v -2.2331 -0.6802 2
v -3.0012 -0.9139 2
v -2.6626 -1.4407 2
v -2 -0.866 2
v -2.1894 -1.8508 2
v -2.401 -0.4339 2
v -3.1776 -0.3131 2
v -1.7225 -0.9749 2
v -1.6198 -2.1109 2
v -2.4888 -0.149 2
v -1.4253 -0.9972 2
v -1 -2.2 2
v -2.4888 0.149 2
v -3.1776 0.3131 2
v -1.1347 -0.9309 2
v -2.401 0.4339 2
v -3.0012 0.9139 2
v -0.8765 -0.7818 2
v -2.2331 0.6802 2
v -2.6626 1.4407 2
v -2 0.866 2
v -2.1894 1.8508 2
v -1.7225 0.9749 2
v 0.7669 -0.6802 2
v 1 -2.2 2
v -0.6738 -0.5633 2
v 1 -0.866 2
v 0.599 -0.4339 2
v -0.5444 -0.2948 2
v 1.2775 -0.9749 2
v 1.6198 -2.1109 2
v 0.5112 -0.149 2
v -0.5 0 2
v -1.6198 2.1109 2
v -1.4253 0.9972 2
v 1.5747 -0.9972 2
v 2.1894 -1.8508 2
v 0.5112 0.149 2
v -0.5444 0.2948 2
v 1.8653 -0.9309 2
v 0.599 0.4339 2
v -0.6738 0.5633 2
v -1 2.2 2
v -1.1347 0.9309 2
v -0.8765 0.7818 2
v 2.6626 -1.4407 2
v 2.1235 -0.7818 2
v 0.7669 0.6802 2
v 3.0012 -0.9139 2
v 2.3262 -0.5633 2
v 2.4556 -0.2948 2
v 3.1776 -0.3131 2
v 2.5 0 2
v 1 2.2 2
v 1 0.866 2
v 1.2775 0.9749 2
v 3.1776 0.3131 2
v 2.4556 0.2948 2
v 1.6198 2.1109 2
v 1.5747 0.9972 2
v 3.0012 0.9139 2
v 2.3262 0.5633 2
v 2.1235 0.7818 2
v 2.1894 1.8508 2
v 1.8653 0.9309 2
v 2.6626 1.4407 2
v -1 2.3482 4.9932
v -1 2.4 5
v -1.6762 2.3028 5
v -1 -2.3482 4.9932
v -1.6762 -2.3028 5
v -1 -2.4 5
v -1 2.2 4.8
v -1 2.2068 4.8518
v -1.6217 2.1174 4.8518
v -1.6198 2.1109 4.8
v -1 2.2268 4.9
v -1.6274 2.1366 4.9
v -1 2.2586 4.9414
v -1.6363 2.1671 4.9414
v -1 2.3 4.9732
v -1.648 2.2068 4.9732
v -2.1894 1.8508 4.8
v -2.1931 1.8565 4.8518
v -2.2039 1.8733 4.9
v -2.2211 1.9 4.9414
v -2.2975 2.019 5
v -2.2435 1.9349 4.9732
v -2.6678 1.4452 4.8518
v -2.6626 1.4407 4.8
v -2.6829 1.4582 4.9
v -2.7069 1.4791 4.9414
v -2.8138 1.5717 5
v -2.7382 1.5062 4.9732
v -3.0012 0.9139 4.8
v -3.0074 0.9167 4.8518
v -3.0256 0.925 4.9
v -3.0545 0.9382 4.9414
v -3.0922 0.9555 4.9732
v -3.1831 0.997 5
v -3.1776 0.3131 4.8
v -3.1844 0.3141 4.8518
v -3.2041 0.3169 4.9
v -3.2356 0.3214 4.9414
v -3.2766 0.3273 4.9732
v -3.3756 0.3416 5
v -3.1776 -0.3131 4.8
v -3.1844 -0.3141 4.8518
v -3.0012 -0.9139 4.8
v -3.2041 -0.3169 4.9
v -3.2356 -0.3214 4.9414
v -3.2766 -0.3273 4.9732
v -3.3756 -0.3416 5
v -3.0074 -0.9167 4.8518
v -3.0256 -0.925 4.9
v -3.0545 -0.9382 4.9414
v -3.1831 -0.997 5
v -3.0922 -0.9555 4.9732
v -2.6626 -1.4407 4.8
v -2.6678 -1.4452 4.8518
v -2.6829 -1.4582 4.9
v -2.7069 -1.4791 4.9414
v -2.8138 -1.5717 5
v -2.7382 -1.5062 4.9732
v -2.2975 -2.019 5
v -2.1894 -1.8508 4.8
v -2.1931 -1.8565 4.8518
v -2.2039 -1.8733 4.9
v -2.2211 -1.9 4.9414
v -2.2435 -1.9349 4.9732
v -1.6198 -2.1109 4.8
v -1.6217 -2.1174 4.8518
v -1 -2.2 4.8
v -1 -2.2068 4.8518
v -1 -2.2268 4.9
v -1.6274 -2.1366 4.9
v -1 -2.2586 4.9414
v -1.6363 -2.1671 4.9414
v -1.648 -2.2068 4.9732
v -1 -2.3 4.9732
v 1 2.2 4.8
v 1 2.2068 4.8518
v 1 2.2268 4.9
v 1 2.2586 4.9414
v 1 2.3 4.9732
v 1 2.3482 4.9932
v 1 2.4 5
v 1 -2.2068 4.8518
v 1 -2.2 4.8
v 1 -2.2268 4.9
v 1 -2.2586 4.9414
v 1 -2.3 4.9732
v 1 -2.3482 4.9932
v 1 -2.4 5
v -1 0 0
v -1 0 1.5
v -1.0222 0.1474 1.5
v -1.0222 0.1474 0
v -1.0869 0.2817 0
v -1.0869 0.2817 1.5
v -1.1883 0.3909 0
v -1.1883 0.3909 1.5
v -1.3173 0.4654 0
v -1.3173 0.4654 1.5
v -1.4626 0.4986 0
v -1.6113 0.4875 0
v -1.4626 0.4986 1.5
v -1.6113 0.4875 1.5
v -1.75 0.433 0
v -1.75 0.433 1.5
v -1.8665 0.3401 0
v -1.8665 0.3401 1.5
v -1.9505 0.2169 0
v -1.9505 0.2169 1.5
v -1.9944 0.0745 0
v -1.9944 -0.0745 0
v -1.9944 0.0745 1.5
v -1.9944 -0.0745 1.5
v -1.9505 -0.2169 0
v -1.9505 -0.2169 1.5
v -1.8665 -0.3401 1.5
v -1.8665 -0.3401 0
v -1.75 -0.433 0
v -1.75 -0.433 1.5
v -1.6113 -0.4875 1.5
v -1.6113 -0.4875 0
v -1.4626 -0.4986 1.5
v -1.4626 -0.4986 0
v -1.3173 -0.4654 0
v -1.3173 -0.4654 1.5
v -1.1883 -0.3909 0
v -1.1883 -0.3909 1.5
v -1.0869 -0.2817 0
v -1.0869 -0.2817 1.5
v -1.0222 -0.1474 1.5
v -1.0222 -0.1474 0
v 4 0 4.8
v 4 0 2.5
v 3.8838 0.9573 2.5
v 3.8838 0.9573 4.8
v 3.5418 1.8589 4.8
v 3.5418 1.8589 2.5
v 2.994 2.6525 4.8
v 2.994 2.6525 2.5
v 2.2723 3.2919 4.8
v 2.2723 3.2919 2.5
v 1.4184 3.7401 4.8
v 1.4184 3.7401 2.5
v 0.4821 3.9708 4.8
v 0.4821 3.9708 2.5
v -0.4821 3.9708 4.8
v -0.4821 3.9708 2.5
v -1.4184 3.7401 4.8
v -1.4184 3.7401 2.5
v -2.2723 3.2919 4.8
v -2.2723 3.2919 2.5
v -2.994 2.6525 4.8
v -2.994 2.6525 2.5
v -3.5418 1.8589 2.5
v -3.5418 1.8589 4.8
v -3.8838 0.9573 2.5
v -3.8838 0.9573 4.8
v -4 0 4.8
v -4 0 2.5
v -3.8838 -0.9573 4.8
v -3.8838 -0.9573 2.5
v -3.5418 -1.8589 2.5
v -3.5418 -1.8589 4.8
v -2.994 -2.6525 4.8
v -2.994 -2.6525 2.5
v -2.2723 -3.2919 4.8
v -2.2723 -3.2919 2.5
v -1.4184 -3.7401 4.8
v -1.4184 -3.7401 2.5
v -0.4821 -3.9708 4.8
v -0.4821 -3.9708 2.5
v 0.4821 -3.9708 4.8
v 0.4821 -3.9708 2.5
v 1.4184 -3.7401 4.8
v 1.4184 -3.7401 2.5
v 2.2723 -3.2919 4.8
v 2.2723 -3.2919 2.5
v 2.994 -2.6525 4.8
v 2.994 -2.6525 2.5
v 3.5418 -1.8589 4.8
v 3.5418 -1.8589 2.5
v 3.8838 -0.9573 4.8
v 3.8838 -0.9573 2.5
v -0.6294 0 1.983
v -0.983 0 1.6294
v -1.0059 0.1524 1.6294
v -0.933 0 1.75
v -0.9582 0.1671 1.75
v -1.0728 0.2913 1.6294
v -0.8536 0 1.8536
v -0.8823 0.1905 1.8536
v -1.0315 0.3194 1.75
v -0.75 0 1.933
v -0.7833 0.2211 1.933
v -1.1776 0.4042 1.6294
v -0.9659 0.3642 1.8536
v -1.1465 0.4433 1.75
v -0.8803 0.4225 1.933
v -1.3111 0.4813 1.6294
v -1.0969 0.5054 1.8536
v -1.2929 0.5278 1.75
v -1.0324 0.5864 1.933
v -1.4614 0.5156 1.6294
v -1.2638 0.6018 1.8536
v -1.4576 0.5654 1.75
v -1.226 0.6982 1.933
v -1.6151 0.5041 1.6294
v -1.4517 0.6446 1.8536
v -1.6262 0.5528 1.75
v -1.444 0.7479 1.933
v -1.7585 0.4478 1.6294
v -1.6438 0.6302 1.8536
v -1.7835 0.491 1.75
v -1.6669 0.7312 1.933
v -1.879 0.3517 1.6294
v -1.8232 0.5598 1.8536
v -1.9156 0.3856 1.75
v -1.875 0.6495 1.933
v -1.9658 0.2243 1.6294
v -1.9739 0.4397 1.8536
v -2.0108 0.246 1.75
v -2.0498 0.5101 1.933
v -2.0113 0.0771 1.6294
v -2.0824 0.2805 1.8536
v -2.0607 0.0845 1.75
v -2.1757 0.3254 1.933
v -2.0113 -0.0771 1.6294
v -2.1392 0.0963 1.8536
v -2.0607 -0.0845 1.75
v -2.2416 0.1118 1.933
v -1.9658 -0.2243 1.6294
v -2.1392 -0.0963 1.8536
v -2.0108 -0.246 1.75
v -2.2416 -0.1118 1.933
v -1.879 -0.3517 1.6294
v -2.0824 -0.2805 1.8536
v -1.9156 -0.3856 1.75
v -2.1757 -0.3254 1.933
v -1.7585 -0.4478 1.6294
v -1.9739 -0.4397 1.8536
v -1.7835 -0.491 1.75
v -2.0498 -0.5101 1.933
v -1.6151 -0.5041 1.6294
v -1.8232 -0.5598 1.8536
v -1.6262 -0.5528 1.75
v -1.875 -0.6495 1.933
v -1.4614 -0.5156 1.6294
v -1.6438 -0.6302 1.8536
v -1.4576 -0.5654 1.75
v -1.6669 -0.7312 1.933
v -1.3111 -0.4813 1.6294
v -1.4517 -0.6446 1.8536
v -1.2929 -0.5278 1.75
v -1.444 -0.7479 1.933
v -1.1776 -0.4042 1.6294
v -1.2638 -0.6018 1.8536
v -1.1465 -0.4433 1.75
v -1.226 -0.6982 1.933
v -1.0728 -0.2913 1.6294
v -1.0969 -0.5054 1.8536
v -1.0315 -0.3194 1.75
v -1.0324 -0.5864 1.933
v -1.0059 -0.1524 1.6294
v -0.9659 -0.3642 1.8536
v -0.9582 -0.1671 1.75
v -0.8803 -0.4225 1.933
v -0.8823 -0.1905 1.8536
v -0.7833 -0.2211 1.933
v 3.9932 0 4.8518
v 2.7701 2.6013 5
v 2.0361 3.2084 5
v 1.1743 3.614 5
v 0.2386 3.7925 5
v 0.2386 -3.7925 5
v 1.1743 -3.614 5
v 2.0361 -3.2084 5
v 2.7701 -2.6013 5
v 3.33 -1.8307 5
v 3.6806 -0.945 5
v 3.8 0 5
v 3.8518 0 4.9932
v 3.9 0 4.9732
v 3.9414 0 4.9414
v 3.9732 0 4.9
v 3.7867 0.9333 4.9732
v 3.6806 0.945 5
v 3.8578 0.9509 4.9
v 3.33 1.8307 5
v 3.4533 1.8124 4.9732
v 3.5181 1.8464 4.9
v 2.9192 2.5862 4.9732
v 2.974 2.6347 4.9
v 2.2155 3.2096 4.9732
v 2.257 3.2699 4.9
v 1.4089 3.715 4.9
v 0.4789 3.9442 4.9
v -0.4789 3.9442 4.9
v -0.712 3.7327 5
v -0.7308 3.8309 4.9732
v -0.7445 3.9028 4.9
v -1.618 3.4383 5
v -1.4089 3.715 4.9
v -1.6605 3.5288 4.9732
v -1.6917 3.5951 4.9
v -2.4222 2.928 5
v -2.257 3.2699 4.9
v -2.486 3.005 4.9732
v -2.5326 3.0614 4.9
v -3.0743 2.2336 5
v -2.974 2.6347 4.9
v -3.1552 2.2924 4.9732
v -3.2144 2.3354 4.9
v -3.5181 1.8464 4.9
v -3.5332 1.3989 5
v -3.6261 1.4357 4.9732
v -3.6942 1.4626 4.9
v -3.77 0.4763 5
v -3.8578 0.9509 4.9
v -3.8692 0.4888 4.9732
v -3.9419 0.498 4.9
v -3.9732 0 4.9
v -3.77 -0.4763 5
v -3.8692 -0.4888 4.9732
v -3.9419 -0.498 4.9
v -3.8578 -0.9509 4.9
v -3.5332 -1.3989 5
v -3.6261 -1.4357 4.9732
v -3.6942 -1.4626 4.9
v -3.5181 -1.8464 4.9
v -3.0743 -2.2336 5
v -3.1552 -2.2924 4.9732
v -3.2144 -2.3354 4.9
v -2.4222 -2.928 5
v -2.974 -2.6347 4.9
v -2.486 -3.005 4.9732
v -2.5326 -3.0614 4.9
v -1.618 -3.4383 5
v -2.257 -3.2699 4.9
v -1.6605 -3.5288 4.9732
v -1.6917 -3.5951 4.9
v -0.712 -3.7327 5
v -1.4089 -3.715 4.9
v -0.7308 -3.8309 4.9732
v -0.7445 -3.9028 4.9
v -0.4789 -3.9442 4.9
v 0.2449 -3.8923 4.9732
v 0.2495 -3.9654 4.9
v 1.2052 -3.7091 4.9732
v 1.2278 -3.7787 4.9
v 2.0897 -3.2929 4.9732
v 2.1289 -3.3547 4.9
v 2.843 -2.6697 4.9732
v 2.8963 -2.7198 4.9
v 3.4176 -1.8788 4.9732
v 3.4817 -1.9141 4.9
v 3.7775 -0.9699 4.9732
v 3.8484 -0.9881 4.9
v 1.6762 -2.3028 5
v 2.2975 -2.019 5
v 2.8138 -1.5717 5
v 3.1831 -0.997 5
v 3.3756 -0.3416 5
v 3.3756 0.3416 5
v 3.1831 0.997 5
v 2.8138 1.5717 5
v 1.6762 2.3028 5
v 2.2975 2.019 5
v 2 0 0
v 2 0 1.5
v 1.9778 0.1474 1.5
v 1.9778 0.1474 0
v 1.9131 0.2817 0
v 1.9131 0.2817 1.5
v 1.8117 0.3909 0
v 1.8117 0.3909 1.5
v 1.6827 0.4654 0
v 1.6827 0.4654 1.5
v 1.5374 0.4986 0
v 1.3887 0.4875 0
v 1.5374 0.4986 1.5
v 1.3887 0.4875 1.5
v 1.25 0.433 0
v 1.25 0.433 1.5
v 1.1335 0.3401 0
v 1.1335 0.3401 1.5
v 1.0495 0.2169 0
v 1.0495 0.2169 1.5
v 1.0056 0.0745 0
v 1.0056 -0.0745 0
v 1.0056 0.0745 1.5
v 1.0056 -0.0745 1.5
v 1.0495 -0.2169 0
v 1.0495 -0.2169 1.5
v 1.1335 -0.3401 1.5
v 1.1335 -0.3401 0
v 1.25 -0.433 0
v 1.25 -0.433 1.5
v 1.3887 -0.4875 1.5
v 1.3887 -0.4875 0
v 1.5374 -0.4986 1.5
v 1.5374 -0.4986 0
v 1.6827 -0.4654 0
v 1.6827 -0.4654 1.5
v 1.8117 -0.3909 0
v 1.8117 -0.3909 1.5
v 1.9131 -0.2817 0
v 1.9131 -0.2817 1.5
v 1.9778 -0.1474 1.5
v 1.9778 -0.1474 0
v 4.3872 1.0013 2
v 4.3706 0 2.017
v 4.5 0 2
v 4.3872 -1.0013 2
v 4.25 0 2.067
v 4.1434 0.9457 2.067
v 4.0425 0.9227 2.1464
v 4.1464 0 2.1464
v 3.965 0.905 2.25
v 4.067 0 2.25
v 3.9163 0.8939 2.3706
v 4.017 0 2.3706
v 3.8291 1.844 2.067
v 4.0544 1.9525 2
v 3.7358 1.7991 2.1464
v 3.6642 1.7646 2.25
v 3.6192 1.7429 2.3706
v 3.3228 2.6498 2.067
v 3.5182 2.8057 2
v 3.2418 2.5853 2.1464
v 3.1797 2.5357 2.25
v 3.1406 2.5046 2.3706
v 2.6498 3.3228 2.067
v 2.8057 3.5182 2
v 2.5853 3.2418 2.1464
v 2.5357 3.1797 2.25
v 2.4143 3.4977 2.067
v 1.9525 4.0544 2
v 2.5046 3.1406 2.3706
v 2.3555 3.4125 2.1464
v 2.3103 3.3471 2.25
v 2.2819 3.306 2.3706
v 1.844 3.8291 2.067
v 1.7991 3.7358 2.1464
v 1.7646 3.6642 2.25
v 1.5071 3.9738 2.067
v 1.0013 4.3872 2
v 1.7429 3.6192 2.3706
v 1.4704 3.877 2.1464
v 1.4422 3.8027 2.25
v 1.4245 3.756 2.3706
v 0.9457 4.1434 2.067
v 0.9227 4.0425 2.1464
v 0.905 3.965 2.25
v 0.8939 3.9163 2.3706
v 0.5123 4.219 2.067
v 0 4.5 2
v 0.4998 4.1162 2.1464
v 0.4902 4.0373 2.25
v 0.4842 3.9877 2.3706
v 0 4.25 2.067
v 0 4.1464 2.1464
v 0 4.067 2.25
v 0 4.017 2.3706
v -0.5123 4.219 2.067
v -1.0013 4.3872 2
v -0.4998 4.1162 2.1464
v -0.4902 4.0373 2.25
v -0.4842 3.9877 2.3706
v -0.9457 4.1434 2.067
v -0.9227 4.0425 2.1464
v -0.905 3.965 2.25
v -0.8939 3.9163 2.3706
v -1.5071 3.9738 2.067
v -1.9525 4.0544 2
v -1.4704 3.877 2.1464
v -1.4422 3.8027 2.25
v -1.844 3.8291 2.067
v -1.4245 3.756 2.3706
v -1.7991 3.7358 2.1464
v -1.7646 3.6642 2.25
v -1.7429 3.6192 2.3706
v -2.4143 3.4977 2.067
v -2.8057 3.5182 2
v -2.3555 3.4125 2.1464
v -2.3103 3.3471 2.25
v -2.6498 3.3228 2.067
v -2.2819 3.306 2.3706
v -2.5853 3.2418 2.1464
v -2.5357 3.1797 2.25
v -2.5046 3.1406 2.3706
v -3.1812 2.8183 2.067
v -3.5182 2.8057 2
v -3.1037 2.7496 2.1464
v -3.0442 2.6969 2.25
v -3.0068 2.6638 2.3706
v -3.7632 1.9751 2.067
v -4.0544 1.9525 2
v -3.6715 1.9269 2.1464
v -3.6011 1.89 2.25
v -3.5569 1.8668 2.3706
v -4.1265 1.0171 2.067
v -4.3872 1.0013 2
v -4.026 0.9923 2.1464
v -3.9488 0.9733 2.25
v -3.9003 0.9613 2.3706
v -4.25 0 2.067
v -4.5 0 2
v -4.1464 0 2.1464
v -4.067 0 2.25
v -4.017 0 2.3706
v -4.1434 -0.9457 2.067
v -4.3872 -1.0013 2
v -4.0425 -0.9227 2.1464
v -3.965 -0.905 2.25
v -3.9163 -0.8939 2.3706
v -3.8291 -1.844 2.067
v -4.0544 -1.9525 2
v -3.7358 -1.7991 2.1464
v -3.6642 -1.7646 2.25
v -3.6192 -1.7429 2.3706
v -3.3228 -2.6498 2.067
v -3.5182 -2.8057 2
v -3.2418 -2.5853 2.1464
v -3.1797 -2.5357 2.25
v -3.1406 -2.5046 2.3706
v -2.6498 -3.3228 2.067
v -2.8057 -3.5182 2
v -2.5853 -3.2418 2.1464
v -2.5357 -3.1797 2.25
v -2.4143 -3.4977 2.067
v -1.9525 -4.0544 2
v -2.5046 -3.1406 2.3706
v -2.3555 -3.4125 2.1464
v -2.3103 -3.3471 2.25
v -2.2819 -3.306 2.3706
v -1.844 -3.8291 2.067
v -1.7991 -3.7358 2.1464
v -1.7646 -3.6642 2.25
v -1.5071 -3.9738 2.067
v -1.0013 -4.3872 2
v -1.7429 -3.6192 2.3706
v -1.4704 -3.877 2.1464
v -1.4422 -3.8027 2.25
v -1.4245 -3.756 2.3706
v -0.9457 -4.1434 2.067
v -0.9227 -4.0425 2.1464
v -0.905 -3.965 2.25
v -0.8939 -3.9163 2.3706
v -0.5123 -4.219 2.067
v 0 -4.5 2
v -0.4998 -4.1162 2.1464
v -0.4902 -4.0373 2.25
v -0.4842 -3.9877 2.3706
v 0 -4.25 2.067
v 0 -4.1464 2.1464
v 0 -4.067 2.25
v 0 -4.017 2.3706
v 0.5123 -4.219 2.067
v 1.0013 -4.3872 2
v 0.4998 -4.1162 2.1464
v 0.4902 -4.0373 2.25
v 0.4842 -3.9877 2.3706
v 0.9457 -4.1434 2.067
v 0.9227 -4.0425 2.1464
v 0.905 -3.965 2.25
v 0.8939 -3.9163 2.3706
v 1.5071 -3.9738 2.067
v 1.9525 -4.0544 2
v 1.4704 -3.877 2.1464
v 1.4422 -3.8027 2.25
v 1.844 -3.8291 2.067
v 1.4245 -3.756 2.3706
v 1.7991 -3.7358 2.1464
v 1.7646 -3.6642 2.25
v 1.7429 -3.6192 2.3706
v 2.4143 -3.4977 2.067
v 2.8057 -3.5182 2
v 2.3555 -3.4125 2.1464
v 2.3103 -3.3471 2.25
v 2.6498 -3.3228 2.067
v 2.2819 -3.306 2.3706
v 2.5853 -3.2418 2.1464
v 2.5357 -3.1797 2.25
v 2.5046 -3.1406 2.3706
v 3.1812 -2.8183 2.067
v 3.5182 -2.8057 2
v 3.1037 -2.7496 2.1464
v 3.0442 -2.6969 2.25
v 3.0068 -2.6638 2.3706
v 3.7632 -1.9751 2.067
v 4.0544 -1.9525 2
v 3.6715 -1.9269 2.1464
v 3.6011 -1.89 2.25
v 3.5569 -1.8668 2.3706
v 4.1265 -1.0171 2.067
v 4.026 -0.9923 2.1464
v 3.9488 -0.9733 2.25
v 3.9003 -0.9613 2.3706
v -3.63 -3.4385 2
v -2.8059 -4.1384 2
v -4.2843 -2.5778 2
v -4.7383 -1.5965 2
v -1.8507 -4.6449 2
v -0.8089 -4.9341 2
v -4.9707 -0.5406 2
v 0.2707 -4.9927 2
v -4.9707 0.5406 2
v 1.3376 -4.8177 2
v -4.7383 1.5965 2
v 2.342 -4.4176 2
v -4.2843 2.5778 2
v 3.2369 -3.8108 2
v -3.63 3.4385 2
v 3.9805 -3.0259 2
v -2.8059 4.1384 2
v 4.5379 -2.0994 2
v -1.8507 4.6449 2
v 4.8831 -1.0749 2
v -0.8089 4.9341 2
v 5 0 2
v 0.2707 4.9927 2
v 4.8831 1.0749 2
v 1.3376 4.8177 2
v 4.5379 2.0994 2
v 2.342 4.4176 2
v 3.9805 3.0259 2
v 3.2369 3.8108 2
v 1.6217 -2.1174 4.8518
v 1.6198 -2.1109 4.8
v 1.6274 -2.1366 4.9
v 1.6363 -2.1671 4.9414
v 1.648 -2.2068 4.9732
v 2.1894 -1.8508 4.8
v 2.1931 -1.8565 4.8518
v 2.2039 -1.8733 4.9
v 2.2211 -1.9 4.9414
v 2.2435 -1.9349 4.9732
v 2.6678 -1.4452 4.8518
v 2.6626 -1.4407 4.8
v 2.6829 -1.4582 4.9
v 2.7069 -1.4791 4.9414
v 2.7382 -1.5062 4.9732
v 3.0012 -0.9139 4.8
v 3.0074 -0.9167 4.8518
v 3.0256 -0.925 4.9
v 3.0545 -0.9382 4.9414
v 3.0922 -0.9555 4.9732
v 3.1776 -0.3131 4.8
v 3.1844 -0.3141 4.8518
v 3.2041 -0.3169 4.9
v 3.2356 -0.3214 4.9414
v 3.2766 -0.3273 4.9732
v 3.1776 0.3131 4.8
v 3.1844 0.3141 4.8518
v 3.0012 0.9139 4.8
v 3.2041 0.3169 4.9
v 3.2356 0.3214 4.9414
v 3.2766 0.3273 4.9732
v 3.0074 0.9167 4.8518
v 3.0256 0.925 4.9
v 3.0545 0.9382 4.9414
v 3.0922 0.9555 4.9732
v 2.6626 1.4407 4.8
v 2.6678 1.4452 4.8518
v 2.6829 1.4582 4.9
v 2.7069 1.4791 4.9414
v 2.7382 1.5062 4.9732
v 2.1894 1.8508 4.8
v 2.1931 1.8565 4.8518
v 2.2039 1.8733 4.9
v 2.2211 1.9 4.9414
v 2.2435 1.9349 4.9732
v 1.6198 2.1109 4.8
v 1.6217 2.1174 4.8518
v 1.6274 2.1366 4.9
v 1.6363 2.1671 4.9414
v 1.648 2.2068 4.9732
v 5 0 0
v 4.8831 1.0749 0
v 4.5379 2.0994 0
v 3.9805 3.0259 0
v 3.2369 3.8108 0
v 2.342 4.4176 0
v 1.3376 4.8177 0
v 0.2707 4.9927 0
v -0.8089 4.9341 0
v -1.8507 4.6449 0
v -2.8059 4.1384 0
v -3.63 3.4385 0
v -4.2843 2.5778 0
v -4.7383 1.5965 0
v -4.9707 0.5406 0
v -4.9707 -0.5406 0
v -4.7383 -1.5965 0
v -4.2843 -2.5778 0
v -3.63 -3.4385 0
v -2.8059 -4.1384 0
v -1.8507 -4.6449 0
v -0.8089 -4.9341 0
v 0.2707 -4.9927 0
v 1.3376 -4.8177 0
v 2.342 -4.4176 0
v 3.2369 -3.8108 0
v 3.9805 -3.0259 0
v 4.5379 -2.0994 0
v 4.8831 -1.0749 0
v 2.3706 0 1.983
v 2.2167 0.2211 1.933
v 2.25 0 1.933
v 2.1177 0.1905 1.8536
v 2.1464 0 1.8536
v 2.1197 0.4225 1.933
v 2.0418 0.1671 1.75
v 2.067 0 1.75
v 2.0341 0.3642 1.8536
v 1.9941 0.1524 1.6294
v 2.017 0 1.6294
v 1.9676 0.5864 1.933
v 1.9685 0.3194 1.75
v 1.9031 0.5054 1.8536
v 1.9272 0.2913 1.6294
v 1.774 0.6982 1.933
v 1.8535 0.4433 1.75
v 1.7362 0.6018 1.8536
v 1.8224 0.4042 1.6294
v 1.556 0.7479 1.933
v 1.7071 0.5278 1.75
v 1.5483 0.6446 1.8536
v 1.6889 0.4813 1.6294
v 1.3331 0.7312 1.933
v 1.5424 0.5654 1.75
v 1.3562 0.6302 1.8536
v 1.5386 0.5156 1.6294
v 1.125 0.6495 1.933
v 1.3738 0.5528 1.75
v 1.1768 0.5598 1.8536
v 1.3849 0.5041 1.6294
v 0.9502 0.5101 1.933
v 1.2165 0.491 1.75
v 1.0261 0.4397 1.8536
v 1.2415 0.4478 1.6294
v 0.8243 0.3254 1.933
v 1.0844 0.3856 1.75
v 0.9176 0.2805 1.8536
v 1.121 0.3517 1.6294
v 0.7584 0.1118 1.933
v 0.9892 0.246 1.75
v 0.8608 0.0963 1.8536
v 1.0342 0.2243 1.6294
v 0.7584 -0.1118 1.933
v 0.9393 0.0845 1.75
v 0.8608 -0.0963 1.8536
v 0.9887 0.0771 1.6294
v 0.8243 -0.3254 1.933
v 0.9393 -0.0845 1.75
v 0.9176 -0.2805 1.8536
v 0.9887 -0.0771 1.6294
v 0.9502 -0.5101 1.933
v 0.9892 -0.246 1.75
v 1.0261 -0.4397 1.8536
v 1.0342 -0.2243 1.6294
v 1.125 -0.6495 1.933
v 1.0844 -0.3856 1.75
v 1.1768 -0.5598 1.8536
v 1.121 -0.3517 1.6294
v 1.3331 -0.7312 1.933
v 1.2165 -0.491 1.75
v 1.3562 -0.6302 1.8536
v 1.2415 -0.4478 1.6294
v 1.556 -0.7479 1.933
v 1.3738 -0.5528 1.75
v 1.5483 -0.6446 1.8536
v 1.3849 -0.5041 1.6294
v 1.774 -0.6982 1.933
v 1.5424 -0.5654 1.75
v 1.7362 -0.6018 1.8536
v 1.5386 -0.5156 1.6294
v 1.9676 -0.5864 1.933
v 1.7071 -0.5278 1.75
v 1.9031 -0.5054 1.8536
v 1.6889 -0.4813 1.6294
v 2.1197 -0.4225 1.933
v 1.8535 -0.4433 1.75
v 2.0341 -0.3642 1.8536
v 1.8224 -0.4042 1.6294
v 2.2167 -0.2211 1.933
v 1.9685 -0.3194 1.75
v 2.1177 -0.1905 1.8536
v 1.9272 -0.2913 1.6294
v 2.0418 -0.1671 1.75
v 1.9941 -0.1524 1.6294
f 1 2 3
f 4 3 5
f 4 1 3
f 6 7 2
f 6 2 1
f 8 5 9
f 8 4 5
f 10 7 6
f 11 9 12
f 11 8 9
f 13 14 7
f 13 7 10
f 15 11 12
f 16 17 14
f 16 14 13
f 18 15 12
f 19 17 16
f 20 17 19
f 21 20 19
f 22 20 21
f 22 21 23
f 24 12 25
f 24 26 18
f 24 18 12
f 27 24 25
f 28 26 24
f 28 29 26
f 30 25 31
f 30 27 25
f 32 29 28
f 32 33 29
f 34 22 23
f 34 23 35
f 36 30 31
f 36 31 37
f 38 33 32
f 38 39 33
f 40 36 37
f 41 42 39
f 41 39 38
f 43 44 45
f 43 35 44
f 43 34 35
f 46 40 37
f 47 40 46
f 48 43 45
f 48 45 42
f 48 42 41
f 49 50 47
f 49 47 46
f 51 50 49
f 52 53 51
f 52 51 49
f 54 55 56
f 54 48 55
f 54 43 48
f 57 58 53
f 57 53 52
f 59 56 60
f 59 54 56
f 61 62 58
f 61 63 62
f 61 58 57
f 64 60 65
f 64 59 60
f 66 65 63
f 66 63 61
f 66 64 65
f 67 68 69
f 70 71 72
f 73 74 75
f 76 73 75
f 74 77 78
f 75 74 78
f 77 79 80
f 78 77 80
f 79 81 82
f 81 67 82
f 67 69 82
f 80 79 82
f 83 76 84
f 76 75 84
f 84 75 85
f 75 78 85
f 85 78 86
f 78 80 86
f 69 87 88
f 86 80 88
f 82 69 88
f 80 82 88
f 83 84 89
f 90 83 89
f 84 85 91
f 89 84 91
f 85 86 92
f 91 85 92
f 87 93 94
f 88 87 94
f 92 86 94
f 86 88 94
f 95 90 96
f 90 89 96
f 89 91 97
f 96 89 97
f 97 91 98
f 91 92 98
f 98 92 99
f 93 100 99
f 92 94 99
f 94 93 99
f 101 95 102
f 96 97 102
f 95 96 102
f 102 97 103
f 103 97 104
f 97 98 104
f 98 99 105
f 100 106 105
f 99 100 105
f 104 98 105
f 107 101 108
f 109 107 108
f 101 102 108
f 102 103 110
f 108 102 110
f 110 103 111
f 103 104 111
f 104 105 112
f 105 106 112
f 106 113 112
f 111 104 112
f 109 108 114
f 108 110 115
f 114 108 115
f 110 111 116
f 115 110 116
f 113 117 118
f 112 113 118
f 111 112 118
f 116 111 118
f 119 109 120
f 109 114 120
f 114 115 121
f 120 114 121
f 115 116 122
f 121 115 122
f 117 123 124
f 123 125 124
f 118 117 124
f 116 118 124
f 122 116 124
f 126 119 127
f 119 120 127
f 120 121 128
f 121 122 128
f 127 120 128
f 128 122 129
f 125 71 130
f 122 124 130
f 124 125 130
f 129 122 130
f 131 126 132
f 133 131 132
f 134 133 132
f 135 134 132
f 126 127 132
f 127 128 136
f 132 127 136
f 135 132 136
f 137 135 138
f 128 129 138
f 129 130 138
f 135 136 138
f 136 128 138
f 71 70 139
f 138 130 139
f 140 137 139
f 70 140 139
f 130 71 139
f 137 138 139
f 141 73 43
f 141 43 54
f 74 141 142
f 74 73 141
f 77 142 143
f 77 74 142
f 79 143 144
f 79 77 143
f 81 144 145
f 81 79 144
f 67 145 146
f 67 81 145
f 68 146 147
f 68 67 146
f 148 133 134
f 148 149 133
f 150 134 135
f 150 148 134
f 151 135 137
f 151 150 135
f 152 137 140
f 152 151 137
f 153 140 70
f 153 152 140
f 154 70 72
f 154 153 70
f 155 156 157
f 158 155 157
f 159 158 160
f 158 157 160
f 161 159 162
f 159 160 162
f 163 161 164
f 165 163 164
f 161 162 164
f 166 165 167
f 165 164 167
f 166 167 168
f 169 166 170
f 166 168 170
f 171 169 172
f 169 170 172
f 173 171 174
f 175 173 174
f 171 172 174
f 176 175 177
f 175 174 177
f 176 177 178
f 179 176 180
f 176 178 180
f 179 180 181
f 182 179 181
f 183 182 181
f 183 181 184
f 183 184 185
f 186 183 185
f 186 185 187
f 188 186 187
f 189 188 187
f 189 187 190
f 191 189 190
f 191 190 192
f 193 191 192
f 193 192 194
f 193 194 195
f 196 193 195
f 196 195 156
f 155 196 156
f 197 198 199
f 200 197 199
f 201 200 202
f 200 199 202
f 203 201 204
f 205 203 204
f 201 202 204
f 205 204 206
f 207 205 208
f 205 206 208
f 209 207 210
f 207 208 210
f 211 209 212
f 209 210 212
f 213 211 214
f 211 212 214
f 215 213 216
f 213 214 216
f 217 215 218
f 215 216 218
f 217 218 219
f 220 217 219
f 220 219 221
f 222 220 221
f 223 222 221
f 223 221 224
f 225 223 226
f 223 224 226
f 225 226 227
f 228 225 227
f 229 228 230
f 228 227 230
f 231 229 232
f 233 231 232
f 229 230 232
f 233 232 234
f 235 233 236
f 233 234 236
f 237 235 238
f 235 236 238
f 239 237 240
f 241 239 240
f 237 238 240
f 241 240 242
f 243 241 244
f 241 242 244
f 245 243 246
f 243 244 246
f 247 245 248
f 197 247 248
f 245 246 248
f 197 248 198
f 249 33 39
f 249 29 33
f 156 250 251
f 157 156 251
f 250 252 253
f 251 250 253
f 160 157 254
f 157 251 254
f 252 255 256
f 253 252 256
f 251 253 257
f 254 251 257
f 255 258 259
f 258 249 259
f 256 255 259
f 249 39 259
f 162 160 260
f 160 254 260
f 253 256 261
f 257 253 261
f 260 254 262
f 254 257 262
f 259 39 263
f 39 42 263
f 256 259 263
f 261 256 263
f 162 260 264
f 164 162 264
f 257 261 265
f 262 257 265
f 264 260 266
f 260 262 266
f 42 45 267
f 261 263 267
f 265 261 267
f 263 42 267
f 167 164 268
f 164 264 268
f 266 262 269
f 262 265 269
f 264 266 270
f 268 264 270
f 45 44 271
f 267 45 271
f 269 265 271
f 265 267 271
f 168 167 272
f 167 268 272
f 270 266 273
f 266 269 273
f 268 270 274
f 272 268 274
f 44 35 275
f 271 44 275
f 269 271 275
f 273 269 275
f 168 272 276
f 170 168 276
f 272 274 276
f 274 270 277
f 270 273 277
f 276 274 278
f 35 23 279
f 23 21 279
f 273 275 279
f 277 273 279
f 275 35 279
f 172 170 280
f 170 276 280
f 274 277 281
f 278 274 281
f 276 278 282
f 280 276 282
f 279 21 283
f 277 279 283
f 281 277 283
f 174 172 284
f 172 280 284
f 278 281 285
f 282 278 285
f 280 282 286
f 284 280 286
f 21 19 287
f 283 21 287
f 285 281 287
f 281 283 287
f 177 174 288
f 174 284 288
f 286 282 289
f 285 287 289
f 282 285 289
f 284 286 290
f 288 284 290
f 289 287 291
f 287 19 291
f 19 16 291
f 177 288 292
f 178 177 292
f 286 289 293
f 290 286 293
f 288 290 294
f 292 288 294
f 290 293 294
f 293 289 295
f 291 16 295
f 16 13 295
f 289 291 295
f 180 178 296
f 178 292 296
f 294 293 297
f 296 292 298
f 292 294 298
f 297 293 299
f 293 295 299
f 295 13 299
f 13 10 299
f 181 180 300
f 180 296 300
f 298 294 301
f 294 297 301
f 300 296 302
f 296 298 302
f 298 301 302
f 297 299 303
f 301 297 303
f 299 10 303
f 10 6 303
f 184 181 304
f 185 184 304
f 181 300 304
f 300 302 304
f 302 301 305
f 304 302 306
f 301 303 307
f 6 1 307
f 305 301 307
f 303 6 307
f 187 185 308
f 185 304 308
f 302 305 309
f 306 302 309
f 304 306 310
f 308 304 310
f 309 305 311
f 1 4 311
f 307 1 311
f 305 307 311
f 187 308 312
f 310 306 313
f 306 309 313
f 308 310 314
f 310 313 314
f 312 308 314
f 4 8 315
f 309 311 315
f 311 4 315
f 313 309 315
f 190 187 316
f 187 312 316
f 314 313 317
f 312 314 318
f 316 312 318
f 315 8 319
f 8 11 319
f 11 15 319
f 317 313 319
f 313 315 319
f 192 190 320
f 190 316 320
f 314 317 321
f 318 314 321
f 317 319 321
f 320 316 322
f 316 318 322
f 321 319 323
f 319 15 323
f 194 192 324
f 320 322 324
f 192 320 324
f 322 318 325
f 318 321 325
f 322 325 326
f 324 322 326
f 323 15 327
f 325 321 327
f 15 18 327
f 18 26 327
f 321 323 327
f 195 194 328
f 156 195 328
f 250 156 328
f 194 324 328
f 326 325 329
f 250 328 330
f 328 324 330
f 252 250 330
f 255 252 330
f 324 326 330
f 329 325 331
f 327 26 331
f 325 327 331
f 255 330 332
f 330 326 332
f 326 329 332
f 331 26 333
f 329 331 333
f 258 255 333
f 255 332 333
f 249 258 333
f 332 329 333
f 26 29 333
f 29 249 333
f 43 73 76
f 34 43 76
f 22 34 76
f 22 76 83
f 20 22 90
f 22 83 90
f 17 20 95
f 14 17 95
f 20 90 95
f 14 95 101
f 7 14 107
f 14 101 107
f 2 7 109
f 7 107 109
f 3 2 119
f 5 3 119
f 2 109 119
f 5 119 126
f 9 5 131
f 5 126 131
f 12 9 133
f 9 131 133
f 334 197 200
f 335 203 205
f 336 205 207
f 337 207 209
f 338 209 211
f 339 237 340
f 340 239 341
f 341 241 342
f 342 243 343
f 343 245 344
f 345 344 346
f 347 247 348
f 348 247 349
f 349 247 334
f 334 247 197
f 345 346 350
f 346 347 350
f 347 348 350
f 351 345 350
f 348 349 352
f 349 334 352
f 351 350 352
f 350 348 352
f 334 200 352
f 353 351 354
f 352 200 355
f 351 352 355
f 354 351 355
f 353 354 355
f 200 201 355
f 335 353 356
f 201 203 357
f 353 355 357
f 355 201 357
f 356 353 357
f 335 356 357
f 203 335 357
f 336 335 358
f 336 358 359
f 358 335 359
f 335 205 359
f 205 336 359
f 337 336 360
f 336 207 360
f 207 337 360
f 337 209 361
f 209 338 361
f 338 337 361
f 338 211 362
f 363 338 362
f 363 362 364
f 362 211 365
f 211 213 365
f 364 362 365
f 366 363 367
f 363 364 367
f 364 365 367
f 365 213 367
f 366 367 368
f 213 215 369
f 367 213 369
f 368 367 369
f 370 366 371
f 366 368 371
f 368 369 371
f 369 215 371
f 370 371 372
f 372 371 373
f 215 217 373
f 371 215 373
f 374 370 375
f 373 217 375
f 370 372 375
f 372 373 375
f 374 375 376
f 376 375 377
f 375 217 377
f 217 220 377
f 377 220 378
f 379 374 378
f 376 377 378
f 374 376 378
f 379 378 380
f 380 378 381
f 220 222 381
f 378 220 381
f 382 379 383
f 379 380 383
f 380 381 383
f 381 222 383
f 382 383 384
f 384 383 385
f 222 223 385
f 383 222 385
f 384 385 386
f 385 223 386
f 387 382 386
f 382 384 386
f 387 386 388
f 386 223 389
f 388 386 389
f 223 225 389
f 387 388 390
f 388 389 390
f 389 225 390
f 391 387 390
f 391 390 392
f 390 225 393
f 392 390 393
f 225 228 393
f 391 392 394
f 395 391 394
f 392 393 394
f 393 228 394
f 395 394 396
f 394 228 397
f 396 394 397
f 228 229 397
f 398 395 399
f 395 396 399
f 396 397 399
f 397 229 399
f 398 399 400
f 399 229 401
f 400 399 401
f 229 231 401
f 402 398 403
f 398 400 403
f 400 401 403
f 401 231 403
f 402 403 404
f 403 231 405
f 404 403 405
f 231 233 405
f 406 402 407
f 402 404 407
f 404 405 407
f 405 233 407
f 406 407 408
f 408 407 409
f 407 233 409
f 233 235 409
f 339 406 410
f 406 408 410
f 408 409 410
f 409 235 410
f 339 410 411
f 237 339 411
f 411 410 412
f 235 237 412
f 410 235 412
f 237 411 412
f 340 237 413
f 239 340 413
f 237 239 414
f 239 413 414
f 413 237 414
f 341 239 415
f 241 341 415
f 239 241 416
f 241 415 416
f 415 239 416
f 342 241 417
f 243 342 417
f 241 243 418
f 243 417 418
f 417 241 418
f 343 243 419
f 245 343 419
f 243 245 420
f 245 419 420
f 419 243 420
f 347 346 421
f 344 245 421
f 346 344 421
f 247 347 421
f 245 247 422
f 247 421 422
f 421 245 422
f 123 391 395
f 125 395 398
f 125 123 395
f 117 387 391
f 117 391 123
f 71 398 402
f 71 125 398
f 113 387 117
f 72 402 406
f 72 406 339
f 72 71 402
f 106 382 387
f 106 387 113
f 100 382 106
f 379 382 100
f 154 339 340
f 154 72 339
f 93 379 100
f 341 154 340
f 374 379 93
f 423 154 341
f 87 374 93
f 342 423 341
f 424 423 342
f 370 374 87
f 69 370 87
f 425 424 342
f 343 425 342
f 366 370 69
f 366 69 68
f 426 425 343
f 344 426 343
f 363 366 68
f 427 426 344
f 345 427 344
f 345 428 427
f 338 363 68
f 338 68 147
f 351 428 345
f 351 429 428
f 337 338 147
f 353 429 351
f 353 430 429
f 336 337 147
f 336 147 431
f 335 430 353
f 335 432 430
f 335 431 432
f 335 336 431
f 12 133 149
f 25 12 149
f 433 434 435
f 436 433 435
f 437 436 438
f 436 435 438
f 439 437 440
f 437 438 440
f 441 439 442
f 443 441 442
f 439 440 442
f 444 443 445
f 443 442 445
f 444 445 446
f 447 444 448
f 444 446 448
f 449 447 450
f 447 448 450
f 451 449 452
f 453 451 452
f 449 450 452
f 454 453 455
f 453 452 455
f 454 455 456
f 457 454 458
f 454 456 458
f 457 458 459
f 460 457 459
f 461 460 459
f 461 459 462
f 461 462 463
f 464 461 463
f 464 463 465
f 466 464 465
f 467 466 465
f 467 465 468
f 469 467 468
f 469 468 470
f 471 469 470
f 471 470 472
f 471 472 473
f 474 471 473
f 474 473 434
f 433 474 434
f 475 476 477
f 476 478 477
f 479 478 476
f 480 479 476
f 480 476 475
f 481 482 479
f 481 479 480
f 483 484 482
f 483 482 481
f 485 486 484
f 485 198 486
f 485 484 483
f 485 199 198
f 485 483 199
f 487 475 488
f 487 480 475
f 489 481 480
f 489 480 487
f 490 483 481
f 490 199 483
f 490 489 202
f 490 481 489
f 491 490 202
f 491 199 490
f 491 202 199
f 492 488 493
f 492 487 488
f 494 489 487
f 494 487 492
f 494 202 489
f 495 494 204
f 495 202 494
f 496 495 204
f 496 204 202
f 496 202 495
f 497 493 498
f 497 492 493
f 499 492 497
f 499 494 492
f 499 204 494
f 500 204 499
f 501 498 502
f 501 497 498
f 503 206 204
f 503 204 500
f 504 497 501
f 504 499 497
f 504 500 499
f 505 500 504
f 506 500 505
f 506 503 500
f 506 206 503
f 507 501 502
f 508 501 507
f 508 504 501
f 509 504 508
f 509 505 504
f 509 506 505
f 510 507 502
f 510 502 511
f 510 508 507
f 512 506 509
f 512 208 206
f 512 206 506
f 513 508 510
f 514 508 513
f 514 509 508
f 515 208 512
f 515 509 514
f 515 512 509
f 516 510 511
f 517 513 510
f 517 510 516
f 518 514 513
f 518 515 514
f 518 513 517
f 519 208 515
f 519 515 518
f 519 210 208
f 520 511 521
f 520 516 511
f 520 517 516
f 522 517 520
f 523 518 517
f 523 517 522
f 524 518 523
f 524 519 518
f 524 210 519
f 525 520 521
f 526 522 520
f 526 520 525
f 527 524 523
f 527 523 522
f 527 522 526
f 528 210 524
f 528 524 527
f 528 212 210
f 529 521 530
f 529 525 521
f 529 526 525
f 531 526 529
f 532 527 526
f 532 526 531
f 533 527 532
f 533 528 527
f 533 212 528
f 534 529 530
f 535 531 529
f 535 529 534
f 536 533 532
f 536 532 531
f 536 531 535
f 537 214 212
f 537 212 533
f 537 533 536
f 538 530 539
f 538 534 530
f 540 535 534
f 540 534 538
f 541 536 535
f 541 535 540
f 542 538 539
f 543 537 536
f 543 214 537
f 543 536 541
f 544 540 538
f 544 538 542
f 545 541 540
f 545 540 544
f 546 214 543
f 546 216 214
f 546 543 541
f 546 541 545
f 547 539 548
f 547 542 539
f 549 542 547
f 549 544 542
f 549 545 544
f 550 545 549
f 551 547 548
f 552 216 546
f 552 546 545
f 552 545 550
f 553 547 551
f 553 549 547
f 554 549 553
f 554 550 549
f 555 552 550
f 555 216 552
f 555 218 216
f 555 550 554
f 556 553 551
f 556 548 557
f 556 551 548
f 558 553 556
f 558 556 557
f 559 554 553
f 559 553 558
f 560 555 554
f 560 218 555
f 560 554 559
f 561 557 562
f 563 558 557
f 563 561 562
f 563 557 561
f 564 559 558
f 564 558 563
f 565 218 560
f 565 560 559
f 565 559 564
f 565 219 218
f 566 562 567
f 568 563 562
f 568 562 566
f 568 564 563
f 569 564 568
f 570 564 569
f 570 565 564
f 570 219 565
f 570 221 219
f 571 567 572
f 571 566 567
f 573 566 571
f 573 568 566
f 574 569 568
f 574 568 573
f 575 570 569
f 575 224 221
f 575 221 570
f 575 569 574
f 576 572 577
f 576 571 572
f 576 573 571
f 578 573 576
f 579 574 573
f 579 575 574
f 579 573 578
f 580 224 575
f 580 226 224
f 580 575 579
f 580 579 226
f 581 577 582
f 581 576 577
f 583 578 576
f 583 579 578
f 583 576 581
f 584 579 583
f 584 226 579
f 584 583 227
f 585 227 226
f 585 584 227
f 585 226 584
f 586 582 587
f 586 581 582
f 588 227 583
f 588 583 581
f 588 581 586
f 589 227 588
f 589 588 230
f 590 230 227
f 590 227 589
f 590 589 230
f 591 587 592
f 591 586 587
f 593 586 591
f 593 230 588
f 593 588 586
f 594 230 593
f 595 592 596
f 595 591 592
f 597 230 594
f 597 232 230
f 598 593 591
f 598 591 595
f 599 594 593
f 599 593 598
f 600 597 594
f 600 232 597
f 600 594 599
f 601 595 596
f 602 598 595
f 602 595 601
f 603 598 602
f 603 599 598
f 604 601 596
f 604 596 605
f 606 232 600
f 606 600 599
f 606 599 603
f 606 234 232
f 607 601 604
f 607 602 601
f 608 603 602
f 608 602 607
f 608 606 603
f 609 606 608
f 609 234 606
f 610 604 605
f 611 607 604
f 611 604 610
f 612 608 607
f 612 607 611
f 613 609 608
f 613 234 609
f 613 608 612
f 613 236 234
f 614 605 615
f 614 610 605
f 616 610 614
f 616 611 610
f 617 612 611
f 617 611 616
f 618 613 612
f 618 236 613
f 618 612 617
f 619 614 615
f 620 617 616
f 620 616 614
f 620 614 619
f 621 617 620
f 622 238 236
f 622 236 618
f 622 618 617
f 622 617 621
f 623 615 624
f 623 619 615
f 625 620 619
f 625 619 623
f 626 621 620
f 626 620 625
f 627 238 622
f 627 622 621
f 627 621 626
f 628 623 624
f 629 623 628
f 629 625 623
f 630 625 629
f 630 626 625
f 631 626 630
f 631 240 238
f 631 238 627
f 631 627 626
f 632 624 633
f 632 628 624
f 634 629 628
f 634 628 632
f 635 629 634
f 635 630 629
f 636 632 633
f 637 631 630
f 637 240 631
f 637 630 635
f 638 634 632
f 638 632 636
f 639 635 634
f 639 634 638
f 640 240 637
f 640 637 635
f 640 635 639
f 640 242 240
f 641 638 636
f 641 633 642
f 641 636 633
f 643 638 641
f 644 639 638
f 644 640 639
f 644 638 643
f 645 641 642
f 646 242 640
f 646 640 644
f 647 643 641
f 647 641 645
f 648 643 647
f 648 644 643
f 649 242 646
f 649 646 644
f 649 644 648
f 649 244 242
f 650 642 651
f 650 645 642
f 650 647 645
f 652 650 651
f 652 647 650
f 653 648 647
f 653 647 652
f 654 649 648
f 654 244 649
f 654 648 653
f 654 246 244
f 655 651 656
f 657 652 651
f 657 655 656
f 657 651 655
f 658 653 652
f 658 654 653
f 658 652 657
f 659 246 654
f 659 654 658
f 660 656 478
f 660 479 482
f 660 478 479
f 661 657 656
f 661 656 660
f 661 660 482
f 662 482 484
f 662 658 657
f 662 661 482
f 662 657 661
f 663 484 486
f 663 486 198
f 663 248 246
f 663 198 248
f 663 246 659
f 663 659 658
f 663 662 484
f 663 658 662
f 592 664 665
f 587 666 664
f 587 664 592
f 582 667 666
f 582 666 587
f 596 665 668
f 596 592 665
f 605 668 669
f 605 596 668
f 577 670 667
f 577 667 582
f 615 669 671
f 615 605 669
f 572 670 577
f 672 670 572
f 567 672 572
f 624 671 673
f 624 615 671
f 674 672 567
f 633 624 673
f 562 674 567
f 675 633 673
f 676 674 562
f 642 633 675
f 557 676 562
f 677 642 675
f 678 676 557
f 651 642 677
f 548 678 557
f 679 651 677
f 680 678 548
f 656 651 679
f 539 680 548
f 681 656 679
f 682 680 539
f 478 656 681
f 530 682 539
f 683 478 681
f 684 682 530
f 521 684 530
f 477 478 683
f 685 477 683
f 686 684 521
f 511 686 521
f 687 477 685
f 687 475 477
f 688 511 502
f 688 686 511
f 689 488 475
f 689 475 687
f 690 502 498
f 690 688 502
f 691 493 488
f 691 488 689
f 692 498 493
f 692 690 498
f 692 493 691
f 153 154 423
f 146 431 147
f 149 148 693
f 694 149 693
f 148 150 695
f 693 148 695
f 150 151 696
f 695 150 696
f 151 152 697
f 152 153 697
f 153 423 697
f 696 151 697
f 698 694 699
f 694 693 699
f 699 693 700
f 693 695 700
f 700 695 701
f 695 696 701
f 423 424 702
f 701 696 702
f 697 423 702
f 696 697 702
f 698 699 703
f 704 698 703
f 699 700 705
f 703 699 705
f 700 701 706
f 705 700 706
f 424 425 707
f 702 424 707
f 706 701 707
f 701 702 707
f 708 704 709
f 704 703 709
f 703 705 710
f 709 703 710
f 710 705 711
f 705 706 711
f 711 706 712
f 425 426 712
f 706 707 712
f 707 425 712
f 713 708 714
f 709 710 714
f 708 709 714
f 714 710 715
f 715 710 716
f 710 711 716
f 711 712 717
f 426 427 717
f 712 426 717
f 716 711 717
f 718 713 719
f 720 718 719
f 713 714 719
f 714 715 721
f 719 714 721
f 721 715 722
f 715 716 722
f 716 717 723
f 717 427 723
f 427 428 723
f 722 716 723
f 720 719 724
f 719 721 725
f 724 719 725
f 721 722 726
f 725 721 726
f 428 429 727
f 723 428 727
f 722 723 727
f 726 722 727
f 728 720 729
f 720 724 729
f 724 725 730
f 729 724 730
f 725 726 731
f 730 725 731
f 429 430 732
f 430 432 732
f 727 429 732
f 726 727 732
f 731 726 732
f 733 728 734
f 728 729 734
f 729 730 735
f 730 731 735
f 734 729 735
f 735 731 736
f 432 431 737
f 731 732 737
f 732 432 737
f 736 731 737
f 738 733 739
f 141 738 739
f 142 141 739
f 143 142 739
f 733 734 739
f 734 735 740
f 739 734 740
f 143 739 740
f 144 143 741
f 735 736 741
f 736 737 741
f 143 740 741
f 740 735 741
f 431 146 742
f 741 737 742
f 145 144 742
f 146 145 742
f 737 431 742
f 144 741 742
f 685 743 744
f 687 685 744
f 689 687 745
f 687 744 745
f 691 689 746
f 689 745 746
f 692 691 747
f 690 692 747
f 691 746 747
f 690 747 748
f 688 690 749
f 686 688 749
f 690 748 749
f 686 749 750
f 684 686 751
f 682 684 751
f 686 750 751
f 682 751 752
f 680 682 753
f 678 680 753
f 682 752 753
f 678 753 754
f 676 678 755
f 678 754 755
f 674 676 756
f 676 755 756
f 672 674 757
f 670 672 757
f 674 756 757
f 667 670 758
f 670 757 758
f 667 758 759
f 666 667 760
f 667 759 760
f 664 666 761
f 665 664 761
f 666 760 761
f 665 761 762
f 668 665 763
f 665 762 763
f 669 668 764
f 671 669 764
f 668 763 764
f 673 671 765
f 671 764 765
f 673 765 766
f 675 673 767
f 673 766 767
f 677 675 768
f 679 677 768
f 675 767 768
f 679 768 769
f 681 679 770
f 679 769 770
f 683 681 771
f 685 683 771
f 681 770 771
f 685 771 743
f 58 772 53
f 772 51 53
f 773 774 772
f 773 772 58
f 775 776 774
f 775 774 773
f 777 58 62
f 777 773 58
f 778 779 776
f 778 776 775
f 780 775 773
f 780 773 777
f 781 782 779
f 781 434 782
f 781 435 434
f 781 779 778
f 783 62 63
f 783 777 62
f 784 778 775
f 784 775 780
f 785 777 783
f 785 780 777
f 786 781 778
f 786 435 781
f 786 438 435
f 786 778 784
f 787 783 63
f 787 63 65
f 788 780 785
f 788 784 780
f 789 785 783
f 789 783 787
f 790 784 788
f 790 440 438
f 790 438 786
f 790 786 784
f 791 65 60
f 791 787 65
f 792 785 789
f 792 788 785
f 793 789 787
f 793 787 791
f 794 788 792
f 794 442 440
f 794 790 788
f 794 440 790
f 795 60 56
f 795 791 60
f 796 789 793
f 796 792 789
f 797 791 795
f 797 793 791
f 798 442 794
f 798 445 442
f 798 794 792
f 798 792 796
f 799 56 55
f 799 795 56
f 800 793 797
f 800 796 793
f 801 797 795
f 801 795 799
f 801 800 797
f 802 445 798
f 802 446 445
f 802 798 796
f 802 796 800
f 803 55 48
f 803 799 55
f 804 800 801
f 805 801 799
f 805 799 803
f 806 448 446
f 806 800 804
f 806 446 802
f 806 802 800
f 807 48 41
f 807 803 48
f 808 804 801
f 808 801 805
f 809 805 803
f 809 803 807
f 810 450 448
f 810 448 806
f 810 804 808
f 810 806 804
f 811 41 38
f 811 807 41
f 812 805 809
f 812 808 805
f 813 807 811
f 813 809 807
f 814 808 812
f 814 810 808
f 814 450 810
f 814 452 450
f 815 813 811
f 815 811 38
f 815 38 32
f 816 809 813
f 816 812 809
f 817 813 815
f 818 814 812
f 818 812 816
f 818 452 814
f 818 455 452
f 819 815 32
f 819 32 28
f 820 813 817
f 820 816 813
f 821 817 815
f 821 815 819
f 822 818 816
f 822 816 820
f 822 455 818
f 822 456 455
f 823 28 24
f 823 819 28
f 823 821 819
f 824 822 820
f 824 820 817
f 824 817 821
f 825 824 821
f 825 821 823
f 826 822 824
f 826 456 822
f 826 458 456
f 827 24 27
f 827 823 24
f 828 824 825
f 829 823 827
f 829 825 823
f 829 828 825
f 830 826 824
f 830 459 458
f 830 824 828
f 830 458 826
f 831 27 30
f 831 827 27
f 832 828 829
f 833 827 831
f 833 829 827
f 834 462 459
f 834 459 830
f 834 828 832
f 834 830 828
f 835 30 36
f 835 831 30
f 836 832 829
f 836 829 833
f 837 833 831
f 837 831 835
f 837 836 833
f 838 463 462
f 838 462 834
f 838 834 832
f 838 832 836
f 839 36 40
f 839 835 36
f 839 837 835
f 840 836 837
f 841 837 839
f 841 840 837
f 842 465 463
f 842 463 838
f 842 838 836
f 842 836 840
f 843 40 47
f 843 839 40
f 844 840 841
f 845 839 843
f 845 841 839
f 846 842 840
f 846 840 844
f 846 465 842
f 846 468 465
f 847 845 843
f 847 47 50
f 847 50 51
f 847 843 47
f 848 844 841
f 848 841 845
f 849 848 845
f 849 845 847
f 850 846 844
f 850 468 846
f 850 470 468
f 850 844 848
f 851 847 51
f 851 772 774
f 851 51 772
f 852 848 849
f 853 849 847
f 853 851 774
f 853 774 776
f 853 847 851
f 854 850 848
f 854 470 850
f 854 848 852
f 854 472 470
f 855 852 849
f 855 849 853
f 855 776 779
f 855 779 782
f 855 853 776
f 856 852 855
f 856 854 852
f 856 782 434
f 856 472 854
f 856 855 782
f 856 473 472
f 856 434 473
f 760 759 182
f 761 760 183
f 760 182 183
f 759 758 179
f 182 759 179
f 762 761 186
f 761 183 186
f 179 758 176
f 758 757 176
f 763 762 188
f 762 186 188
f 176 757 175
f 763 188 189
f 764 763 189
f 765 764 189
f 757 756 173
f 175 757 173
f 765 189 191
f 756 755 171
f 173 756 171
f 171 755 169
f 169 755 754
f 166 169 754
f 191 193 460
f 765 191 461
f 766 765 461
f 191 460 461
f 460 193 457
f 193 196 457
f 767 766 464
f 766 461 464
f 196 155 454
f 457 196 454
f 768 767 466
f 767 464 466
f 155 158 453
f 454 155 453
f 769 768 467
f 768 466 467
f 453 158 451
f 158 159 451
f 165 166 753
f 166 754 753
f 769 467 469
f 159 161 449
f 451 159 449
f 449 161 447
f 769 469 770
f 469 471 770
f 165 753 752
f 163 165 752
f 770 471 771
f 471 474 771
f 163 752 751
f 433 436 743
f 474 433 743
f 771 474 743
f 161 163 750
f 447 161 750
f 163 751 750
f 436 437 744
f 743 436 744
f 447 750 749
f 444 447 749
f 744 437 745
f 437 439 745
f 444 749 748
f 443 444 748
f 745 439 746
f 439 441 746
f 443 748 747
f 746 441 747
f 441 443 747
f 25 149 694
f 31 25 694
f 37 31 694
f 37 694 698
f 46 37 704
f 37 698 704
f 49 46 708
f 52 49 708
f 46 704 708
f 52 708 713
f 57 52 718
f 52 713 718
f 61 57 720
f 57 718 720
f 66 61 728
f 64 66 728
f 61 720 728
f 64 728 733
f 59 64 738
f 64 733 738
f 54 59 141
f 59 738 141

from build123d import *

# Parameters (mm, degrees)
SKETCH_R        = 5
PAD_DEPTH       = 2
SKETCH001_R     = 4
PAD001_DEPTH    = 3
POCKET_DEPTH    = 3
SKETCH003_R     = 0.5
POCKET001_DEPTH = 5.001
FILLET_R        = 0.5
FILLET001_R     = 0.5
FILLET002_R     = 0.5
FILLET003_R     = 0.2


with BuildPart() as part:
    # Sketch → Pad (new body)
    with BuildSketch(Plane.XY):
        Circle(SKETCH_R)
    extrude(amount=PAD_DEPTH)

    # Sketch001 (on Face3 of Pad) → Pad001 (join)
    with BuildSketch(Plane.XY.offset(2)):
        Circle(SKETCH001_R)
    extrude(amount=PAD001_DEPTH)

    # Sketch002 (on Face5 of Pad001) → Pocket (cut)
    with BuildSketch(Plane.XY.offset(5)):
        with BuildLine():
            ThreePointArc((-1, 2.2), (-3.2, 0), (-1, -2.2))
            Line((-1, -2.2), (1, -2.2))
            ThreePointArc((1, -2.2), (3.2, 0), (1, 2.2))
            Line((-1, 2.2), (1, 2.2))
        make_face()
    extrude(amount=-POCKET_DEPTH, mode=Mode.SUBTRACT)

    # Sketch003 (on Face5 of Pocket) → Pocket001 (cut, through all)
    with BuildSketch(Plane.XY.offset(5)):
        with Locations((-1.5, 0)):
            Circle(SKETCH003_R)
        with Locations((1.5, 0)):
            Circle(SKETCH003_R)
    extrude(amount=-POCKET001_DEPTH, mode=Mode.SUBTRACT)

    # Fillet
    fillet_edges = [part.edges().sort_by_distance(p)[0] for p in [
        (-4, 0, 2),
    ]]
    fillet(fillet_edges, radius=FILLET_R)

    # Fillet001
    fillet001_edges = [part.edges().sort_by_distance(p)[0] for p in [
        (-2, 0, 2),
    ]]
    fillet(fillet001_edges, radius=FILLET001_R)

    # Fillet002
    fillet002_edges = [part.edges().sort_by_distance(p)[0] for p in [
        (1, 0, 2),
    ]]
    fillet(fillet002_edges, radius=FILLET002_R)

    # Fillet003
    fillet003_edges = [part.edges().sort_by_distance(p)[0] for p in [
        (-4, 0, 5),
        (-3.2, 0, 5),
        (0, -2.2, 5),
        (3.2, 0, 5),
        (0, 2.2, 5),
    ]]
    fillet(fillet003_edges, radius=FILLET003_R)


solid = part.part
